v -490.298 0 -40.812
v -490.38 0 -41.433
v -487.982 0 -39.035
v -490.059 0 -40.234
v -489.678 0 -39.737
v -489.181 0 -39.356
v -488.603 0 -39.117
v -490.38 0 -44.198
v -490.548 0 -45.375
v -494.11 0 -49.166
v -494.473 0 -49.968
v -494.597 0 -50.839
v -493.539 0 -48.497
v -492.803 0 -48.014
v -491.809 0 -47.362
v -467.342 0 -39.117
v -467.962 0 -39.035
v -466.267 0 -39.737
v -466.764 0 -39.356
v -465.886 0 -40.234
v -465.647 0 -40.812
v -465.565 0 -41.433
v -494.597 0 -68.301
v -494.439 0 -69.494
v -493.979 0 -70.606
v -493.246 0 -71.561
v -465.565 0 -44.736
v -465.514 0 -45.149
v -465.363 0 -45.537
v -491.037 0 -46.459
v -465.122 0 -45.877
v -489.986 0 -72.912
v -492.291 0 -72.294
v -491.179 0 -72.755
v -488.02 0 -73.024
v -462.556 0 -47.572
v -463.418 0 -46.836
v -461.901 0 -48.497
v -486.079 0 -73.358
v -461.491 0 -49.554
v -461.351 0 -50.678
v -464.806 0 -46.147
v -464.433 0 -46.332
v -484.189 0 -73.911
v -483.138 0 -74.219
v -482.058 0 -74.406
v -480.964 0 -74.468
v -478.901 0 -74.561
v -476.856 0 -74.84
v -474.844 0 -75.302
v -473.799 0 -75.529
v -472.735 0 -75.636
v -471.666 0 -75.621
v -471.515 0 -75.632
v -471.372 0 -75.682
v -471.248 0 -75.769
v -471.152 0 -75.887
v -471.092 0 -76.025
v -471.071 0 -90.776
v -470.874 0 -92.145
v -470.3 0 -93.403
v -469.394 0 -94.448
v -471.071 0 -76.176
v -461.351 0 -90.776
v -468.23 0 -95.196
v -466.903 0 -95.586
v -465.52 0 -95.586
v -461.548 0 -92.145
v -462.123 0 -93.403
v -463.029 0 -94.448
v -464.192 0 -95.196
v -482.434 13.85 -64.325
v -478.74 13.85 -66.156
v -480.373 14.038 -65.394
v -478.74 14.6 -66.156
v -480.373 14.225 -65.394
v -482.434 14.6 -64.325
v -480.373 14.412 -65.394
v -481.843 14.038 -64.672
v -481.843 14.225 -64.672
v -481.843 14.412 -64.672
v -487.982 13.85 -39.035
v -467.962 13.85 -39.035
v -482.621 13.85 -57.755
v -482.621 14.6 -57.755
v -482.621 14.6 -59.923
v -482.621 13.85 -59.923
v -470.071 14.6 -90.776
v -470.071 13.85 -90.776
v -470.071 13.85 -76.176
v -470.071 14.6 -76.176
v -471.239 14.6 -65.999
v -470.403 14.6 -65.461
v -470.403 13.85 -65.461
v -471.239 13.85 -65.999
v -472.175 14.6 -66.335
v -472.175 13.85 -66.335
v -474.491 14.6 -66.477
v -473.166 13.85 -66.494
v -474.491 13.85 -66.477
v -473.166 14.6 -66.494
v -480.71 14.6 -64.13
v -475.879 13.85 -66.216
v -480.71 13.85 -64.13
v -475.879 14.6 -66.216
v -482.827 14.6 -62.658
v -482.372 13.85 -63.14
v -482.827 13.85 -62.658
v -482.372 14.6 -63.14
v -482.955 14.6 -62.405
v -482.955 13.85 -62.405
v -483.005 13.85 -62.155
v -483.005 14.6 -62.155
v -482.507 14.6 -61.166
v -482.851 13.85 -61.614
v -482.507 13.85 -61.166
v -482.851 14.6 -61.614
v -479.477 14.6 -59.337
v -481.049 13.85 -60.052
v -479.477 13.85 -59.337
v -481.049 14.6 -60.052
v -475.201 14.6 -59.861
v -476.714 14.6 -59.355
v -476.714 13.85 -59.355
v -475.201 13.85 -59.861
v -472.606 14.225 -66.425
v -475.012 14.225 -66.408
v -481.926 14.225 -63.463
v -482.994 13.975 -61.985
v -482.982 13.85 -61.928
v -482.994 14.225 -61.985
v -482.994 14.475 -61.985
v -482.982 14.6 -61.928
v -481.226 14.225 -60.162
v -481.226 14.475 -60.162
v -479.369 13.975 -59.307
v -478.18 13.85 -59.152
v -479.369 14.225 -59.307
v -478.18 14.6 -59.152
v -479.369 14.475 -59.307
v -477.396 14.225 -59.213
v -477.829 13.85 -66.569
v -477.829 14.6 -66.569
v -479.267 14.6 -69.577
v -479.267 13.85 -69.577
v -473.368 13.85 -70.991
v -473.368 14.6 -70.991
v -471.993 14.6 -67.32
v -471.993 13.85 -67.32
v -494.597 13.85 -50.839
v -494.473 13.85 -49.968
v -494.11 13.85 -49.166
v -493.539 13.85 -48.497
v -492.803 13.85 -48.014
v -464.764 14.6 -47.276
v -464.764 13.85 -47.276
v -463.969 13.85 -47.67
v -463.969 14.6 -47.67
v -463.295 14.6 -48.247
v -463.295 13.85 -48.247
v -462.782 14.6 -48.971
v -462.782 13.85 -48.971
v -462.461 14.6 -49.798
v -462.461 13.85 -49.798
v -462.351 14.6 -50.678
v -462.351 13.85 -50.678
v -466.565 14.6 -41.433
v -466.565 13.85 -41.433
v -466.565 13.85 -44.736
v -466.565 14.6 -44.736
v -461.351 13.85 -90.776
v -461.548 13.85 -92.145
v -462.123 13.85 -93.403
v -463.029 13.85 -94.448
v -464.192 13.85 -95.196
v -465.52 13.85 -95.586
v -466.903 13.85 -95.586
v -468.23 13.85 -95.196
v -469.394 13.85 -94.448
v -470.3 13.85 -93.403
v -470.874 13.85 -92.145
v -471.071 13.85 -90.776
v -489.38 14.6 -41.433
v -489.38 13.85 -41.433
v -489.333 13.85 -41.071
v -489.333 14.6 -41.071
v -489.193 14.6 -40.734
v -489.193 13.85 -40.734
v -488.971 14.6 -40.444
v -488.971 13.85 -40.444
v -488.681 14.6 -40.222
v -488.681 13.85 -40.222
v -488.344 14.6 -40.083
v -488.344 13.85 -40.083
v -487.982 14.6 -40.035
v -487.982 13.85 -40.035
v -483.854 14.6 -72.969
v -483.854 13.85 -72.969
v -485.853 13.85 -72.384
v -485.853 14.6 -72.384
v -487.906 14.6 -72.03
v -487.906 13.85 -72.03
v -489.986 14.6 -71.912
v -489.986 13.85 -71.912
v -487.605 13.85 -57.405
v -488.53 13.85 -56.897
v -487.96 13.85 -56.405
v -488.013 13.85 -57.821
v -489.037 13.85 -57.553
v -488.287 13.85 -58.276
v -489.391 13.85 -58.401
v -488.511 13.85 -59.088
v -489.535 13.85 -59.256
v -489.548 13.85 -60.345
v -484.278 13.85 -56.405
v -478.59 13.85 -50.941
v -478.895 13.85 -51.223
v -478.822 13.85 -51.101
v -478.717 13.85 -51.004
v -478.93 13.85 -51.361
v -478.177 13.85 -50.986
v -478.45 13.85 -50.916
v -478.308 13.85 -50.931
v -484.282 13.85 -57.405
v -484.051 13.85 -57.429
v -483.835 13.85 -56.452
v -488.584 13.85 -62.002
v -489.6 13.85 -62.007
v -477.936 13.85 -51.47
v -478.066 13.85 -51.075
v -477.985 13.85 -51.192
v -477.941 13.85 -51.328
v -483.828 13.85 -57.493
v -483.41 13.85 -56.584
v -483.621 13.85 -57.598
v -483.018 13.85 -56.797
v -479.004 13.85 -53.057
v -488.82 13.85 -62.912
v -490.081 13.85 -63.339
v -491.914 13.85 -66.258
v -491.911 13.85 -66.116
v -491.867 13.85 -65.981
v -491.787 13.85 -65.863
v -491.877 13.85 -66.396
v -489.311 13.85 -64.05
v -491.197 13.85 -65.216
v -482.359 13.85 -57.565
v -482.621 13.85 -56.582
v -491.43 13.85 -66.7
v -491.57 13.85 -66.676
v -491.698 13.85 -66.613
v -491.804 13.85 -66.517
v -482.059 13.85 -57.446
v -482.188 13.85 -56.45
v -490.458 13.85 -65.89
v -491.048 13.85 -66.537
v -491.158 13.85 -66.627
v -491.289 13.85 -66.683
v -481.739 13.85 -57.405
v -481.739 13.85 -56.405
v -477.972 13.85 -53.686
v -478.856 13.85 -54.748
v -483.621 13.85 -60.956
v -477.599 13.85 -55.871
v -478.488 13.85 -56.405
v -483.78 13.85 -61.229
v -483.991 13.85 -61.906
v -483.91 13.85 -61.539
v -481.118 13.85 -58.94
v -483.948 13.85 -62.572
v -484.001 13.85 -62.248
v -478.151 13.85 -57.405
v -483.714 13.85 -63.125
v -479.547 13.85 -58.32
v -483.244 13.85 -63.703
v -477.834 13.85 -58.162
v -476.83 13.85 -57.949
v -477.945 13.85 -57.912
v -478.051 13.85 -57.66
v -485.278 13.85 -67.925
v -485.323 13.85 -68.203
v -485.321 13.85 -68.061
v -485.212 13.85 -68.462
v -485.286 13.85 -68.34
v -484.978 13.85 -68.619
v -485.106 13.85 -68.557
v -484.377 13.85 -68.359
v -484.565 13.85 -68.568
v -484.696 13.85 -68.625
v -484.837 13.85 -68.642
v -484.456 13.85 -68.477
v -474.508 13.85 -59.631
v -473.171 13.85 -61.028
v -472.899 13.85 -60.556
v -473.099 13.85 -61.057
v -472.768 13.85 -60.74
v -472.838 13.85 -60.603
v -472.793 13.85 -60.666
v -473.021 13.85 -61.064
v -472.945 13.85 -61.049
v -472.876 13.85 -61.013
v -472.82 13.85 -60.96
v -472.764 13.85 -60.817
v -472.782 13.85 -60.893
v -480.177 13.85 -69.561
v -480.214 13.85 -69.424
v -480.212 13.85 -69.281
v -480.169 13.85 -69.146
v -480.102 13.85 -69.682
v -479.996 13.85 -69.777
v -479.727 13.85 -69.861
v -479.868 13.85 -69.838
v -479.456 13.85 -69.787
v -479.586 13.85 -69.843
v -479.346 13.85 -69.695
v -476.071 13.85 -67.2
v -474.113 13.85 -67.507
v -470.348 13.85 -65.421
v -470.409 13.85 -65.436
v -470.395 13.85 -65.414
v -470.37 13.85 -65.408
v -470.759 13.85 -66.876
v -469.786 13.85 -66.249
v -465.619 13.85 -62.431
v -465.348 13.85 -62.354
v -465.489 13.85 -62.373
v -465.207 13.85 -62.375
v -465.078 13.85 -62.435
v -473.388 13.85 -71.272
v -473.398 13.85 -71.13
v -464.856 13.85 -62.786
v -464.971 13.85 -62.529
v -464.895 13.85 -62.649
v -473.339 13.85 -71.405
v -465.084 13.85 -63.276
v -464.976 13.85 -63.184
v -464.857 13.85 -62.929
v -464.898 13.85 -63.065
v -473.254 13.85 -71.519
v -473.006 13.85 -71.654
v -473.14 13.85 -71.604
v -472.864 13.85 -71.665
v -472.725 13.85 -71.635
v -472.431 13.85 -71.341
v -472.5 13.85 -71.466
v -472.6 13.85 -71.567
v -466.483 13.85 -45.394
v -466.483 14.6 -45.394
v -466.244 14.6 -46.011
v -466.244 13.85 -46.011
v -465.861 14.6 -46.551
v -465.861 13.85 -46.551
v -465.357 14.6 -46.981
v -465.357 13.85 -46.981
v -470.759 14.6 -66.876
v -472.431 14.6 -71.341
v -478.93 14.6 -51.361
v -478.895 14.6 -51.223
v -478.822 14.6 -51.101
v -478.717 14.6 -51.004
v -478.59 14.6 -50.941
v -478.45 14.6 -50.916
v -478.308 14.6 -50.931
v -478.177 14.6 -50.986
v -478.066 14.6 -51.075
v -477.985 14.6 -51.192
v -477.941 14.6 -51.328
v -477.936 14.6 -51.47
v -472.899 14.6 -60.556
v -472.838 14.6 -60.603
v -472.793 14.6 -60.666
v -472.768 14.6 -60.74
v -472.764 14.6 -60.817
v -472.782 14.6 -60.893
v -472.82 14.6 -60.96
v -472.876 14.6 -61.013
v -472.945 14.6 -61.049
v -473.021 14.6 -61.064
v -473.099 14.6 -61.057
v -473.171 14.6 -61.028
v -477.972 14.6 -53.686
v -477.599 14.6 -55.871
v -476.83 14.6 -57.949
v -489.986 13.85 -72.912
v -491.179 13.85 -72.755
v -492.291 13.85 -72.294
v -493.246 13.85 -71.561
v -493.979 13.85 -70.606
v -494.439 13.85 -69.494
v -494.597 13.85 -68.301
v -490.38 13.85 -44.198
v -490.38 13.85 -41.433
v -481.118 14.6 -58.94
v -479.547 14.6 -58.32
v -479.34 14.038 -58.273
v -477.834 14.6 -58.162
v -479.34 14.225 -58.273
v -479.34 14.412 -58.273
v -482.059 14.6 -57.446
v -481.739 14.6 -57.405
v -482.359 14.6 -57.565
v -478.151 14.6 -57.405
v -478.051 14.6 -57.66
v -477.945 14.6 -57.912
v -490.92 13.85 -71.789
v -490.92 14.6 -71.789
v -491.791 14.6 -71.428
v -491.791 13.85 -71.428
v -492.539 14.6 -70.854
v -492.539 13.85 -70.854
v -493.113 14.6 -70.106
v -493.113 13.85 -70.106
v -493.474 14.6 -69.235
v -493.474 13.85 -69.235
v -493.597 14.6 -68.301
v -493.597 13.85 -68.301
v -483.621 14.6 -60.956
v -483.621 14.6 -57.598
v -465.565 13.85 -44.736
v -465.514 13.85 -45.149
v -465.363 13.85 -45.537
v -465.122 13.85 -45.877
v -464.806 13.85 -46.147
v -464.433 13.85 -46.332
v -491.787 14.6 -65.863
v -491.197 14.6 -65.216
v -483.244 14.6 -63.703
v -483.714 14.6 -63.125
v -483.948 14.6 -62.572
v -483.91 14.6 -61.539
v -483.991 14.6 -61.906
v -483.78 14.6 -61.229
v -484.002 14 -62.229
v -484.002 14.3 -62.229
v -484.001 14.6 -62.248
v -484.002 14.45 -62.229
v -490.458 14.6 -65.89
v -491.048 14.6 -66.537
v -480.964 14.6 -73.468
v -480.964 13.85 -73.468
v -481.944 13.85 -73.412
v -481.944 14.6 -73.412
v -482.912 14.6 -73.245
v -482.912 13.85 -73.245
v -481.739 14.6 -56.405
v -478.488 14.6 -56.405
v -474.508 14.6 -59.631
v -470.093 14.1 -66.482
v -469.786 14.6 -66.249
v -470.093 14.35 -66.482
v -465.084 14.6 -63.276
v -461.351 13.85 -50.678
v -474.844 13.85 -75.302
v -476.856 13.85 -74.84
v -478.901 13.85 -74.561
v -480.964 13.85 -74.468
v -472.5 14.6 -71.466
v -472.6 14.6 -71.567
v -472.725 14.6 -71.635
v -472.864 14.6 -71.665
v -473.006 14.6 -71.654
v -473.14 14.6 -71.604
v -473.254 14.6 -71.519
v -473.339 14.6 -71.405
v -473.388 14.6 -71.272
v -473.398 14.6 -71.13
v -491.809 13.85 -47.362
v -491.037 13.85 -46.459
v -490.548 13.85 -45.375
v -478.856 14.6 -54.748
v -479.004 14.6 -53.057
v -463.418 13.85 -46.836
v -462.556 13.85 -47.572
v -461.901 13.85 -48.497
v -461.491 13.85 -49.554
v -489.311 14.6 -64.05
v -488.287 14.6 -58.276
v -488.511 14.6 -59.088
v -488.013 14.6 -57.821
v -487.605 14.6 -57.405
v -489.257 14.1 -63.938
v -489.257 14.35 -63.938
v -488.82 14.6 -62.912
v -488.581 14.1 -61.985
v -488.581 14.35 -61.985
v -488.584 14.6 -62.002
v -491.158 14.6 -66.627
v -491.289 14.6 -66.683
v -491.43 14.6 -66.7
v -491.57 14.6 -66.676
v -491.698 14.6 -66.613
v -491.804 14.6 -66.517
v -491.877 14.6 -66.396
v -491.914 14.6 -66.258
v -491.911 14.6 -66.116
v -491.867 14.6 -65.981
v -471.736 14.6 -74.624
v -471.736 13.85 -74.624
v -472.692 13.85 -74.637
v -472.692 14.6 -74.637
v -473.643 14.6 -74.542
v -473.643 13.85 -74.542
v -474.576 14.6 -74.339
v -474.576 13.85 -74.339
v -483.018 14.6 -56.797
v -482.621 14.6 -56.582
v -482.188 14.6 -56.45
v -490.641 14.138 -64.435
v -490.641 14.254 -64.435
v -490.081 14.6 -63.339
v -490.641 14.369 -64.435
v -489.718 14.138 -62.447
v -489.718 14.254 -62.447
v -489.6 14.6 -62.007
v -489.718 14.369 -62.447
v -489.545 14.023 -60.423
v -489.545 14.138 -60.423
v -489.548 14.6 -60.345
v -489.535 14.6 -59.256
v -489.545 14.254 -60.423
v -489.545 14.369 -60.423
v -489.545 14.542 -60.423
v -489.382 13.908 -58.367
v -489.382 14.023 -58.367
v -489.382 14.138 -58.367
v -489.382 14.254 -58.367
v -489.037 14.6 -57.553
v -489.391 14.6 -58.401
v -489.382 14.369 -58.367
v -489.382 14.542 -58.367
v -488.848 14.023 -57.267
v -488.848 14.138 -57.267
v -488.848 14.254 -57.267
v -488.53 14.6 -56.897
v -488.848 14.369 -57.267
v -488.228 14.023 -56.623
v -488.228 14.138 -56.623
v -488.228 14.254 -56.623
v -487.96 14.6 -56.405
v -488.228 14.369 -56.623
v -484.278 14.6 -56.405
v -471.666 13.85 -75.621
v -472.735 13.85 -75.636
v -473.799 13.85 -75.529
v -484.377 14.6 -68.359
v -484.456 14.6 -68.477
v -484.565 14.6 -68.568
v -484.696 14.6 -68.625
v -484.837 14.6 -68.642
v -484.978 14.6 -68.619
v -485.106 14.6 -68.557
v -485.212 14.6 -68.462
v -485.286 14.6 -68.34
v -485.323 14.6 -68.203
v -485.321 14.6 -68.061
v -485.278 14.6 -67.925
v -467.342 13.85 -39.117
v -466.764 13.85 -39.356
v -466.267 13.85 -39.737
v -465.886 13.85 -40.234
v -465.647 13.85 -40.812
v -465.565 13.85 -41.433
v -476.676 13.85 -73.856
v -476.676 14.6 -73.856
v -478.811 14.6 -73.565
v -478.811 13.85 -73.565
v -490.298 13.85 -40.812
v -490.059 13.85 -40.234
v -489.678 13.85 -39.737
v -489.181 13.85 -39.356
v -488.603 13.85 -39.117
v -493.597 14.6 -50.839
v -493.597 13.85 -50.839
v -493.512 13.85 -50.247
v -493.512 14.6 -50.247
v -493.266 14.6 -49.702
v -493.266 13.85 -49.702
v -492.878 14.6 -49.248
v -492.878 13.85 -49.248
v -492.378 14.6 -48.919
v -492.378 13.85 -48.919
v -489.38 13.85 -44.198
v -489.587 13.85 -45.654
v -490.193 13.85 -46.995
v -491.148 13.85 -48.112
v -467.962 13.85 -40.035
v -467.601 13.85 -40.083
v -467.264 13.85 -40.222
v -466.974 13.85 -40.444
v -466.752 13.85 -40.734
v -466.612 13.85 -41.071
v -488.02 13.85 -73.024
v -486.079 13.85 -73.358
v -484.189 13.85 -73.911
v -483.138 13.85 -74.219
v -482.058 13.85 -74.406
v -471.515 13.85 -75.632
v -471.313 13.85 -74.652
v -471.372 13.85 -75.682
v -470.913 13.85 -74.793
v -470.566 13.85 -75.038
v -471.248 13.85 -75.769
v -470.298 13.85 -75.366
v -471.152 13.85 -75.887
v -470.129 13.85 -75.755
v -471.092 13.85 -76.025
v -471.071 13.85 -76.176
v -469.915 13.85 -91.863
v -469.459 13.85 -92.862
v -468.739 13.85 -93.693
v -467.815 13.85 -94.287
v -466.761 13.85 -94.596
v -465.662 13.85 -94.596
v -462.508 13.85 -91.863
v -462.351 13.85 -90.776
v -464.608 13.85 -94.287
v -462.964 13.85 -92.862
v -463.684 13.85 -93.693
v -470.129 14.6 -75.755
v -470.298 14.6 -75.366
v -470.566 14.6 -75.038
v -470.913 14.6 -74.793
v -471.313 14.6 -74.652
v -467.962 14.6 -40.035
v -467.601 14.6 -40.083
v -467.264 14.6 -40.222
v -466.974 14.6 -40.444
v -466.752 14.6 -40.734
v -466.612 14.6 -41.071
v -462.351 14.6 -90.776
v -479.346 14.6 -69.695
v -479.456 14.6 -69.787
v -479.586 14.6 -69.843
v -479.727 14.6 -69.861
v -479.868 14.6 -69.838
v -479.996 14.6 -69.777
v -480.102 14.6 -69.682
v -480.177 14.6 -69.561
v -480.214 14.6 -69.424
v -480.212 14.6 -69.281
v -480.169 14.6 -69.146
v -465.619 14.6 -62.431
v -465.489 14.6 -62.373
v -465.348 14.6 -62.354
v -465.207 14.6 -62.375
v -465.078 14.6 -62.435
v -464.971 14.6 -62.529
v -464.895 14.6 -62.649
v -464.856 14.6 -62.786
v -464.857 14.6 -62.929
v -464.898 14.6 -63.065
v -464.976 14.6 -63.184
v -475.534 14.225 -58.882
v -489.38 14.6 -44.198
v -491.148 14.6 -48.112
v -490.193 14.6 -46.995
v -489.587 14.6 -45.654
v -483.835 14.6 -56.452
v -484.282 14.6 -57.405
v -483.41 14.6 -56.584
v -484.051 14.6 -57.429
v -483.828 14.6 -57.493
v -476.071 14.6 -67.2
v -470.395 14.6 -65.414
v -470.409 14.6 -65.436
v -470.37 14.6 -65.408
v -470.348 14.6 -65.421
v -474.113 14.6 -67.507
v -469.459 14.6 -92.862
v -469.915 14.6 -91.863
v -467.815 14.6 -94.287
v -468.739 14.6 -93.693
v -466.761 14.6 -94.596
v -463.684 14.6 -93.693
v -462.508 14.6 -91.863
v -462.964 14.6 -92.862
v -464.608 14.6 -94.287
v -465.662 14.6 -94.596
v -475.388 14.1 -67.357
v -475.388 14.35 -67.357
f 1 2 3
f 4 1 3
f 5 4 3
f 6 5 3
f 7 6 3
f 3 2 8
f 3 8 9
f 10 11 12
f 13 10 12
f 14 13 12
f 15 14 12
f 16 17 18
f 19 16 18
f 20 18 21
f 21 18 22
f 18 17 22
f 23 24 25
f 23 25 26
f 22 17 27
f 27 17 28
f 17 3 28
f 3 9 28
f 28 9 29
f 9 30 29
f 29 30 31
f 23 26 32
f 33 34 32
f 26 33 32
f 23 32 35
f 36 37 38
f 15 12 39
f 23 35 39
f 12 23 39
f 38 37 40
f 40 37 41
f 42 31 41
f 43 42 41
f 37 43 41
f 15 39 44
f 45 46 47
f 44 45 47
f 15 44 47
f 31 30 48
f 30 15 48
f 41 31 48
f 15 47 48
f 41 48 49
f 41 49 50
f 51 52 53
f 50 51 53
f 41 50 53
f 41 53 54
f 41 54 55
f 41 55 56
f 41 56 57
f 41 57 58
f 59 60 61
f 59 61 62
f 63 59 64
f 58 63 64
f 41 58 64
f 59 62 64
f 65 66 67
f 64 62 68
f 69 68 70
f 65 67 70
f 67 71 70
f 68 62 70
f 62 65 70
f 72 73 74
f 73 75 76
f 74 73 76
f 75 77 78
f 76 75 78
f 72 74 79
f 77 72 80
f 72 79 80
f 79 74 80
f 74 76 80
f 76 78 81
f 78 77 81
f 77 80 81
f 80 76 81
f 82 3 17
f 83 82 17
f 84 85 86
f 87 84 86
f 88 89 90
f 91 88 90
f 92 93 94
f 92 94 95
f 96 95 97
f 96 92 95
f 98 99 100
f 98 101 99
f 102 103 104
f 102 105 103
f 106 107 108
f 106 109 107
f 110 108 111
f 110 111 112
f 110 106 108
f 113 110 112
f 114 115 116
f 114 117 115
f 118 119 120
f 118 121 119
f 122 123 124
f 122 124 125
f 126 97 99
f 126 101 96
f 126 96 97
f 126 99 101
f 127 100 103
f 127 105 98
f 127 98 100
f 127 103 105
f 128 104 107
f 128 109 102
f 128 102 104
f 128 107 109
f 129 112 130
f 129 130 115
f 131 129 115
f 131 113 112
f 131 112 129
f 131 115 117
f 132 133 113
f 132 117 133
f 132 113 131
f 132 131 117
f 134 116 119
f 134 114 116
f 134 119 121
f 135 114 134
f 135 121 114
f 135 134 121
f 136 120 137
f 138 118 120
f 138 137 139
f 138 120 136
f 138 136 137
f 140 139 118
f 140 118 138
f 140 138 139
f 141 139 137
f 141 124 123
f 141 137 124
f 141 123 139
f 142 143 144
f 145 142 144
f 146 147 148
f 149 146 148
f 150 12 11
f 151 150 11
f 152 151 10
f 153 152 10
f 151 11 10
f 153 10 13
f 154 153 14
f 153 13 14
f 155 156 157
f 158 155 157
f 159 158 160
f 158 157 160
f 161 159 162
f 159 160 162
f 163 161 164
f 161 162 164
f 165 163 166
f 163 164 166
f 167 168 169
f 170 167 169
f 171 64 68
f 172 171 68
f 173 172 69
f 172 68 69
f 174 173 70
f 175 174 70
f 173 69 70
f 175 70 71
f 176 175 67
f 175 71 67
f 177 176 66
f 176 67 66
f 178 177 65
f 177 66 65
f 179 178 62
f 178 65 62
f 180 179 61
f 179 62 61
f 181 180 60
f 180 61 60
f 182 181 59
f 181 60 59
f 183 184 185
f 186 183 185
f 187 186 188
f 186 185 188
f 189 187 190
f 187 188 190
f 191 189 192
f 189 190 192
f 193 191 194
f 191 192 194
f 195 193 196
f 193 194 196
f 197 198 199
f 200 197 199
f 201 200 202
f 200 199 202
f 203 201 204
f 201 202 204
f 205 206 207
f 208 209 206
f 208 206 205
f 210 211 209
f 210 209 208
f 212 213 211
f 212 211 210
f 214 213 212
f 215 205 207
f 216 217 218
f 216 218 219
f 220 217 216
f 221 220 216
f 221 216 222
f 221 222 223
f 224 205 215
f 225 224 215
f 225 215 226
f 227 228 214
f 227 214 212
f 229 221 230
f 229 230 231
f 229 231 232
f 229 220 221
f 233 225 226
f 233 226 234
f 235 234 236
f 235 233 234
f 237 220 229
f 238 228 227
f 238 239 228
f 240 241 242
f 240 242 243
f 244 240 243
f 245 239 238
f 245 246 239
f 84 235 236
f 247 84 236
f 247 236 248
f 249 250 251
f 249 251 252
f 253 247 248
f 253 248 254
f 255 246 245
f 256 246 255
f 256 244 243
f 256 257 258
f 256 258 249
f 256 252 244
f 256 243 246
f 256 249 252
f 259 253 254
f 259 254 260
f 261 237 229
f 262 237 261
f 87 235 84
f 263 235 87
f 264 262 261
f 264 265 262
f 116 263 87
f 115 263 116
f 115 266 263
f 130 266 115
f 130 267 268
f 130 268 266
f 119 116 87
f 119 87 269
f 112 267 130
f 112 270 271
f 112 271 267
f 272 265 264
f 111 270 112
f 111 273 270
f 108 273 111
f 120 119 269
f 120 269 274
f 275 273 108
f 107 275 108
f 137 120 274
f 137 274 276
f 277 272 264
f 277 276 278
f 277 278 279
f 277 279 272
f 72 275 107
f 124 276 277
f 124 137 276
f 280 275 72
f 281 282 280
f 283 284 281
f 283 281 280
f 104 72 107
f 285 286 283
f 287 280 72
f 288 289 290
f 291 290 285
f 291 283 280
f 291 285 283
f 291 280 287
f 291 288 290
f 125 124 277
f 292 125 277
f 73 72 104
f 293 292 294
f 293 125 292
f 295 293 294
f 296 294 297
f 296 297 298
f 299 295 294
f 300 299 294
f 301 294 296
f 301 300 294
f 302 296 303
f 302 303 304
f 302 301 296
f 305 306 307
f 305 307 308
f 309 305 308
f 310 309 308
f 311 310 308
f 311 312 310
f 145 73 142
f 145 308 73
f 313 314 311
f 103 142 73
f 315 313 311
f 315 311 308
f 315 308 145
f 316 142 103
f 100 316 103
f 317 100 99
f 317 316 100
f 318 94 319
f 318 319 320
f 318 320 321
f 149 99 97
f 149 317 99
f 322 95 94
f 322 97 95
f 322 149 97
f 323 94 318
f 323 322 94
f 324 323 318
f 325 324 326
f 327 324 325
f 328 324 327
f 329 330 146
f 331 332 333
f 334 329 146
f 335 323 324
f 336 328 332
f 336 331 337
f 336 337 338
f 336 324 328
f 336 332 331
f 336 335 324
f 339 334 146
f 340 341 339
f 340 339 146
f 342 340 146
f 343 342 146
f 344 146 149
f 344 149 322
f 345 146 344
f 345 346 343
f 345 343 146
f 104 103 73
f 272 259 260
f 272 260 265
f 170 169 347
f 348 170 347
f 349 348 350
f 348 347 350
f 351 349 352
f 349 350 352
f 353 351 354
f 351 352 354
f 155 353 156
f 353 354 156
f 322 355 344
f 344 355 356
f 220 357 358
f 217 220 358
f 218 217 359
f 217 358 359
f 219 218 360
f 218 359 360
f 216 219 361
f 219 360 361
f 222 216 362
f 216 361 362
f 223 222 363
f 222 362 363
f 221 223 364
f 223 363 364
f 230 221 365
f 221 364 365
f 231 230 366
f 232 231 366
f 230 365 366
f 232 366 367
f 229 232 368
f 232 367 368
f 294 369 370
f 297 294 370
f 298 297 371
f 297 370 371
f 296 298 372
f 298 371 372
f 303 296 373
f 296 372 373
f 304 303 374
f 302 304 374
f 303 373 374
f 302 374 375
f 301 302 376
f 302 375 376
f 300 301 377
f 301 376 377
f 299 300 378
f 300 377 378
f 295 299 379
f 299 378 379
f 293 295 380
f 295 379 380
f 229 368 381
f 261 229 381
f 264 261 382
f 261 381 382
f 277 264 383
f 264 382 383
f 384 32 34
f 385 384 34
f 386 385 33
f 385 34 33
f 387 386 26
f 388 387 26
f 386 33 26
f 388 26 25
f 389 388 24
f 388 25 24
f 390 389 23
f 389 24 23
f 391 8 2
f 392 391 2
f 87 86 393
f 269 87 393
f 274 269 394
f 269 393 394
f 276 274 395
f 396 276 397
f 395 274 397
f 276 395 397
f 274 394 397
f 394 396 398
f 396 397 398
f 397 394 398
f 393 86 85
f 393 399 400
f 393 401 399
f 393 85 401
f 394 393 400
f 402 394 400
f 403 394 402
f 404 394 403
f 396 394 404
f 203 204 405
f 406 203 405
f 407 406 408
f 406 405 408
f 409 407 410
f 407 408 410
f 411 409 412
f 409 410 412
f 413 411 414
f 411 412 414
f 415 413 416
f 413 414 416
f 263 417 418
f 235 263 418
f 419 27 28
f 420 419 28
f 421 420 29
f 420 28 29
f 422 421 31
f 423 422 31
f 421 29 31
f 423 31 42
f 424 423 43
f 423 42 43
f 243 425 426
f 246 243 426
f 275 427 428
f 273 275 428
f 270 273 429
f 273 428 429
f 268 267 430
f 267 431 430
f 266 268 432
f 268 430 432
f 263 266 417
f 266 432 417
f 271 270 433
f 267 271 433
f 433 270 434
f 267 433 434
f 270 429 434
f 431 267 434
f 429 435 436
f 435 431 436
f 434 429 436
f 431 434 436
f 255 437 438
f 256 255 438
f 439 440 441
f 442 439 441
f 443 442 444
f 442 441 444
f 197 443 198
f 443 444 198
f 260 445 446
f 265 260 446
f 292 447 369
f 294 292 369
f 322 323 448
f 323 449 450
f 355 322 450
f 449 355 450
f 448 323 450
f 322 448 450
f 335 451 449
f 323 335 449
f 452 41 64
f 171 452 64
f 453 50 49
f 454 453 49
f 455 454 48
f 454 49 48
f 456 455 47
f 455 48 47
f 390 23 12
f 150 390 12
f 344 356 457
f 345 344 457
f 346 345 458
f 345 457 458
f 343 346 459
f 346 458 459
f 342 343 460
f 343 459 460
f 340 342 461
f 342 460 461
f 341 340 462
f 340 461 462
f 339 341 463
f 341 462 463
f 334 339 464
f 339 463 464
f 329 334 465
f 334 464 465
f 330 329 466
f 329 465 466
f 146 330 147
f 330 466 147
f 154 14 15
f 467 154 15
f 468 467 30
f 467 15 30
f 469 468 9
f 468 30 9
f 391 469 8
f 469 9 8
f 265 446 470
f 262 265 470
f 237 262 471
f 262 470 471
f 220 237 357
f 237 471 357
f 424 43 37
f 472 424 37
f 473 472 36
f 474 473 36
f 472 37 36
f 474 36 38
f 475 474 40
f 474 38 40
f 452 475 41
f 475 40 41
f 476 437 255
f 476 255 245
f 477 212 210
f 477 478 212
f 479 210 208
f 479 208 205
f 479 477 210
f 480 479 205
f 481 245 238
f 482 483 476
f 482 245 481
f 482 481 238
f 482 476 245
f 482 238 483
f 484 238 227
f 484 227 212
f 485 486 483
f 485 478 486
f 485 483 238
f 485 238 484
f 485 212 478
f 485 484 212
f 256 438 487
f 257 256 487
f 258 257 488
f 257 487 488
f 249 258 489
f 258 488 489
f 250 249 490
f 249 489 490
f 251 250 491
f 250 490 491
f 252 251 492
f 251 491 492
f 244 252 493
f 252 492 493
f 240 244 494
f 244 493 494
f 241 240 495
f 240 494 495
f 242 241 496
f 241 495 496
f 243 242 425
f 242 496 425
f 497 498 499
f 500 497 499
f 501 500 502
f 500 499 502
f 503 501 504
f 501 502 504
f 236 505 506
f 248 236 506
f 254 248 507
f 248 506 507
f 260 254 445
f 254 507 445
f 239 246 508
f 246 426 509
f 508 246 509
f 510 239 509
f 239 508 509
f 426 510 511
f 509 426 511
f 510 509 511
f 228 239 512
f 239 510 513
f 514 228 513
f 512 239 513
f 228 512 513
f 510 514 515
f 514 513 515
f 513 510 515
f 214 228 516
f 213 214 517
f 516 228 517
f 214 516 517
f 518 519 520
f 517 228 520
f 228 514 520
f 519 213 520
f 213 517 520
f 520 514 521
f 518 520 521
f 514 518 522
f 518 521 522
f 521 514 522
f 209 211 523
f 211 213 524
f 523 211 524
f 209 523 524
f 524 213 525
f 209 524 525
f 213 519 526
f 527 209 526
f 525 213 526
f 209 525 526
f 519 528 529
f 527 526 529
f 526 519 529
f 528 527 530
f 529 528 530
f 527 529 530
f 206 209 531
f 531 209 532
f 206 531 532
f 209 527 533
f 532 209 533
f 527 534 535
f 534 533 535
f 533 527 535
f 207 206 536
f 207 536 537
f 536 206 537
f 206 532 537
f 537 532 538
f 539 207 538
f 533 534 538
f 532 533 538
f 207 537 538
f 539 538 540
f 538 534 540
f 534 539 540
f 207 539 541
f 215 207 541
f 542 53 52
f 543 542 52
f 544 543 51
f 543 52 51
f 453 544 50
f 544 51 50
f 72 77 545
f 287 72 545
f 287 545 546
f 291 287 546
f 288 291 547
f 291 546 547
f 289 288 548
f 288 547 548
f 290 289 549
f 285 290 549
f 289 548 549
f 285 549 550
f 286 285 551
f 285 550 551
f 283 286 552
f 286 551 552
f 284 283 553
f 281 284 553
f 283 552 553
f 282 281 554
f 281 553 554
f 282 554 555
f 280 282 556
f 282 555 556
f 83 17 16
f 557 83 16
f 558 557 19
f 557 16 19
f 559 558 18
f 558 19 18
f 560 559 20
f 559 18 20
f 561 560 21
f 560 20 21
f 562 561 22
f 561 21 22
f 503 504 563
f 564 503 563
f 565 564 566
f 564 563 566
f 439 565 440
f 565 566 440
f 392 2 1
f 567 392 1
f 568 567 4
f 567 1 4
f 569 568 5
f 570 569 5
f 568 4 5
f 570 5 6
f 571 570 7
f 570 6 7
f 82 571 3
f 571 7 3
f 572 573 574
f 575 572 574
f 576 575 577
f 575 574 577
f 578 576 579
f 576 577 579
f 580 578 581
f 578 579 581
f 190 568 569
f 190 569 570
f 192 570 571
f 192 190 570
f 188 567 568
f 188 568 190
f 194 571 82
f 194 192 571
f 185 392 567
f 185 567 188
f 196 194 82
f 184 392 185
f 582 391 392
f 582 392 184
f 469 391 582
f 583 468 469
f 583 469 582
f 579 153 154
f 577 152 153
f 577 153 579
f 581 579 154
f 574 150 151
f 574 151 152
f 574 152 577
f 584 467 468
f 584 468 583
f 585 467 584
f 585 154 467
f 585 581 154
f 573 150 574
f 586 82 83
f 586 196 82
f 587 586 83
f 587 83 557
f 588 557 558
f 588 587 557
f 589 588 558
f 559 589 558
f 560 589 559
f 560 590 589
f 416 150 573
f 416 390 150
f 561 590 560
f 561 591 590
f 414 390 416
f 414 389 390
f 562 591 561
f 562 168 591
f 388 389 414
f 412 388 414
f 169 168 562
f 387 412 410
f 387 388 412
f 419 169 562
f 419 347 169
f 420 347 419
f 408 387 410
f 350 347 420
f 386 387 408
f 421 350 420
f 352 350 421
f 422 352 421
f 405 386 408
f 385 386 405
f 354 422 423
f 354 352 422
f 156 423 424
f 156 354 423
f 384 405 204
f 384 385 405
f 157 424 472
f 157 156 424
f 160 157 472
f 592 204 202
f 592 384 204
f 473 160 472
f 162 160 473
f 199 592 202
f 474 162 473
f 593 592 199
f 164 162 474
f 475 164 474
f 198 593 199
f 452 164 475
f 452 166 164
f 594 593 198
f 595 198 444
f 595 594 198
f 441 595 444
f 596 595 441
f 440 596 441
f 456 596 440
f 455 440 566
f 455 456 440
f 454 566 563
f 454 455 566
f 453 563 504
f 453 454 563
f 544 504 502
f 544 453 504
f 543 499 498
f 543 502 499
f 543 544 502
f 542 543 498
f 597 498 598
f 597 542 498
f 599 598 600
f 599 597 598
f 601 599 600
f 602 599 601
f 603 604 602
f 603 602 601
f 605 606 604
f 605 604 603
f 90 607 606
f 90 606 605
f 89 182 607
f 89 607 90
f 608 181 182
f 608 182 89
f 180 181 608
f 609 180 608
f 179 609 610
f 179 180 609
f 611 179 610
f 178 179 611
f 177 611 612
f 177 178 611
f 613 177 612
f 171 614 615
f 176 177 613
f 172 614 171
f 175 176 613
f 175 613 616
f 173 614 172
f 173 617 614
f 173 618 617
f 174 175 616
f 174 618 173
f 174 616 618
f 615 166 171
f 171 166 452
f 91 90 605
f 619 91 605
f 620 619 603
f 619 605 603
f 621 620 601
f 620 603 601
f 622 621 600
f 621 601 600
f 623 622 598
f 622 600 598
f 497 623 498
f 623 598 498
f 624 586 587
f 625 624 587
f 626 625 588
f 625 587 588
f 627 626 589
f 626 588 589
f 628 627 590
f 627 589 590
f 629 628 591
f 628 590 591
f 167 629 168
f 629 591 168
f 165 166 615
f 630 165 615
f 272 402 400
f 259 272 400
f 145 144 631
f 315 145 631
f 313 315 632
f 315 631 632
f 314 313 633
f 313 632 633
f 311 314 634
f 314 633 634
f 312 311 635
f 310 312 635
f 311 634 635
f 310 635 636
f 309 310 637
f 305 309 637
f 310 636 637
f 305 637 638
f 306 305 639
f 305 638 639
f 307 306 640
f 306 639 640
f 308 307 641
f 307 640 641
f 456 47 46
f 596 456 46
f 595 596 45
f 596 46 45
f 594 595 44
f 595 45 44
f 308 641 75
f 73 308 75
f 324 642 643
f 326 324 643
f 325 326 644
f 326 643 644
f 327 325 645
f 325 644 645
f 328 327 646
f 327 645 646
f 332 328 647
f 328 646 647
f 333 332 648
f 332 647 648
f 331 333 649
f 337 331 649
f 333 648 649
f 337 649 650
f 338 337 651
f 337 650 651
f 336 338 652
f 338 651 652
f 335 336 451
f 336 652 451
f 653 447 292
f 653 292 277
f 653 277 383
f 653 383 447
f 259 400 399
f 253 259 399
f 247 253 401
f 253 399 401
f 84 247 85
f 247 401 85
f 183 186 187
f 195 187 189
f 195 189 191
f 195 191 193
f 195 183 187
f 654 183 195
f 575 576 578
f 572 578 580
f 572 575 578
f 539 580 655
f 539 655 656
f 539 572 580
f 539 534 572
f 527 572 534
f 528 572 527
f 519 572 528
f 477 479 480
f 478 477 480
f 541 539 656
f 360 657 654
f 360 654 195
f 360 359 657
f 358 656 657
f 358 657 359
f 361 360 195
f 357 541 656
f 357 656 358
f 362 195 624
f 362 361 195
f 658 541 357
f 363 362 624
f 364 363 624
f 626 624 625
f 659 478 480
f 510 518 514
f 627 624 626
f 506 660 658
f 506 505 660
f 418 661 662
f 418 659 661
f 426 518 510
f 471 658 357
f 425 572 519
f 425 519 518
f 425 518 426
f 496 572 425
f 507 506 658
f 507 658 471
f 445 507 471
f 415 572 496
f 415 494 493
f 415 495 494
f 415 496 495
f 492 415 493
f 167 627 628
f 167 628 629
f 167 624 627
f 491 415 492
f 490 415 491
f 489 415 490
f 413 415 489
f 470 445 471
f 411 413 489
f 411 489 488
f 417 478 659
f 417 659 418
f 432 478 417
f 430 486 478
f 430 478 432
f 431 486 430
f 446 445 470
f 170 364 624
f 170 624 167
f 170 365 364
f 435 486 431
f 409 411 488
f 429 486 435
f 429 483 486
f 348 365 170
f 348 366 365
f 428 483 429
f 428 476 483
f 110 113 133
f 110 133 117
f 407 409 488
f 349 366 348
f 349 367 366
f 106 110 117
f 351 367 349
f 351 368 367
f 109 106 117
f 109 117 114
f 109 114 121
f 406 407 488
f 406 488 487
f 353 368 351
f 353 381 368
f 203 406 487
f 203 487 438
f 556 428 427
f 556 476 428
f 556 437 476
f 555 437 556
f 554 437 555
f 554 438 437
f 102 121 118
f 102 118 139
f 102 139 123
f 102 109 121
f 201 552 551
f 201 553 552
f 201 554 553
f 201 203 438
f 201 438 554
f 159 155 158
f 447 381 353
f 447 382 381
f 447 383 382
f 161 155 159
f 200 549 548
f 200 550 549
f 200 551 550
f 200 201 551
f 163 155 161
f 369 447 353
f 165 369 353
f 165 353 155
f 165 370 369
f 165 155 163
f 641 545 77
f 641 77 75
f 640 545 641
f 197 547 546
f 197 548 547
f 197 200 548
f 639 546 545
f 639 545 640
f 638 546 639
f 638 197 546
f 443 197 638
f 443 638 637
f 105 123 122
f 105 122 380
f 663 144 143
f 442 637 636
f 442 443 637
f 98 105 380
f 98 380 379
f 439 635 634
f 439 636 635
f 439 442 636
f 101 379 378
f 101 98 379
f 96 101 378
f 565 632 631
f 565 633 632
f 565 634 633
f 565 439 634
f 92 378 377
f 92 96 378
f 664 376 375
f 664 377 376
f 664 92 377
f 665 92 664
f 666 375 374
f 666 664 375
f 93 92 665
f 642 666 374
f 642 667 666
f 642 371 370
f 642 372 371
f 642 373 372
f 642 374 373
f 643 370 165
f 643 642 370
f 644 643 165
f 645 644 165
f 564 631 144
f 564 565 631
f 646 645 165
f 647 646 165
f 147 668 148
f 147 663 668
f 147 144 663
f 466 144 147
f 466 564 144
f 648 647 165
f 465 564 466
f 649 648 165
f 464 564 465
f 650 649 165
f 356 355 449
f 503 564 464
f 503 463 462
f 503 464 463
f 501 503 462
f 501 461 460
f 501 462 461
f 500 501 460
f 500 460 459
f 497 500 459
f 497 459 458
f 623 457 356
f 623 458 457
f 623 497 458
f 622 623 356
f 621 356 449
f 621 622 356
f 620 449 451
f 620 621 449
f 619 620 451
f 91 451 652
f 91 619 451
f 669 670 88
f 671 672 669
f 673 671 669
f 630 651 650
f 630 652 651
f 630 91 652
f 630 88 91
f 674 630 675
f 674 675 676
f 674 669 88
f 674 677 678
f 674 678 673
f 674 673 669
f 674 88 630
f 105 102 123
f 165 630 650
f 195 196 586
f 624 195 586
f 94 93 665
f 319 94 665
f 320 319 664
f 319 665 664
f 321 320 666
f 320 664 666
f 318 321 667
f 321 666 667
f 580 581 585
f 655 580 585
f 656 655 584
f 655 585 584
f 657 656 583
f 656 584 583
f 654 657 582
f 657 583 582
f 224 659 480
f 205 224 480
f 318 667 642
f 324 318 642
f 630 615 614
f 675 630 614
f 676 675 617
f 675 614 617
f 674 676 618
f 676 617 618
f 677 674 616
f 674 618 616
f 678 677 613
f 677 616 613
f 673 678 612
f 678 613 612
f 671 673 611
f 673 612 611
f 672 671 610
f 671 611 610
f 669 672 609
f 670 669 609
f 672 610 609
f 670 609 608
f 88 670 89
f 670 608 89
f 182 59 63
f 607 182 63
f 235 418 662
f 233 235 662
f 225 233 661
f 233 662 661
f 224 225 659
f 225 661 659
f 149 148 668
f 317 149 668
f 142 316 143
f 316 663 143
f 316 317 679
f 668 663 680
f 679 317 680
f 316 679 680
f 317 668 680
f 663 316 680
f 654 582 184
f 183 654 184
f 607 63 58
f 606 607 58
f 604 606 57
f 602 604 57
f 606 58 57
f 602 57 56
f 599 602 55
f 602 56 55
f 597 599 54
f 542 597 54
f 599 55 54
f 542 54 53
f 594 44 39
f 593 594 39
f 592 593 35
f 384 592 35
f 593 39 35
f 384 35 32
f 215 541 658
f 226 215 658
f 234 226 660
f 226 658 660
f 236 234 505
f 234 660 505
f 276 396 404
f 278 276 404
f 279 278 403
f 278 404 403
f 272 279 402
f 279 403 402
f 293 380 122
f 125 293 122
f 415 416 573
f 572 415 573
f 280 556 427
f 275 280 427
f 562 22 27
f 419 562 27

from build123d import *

# Parameters (mm, degrees)
BOSS_EXTRU_1_DEPTH = 14.6
CUT_EXTRUDE1_DEPTH = 0.75
CUT_EXTRUDE2_START = -0.75
CUT_EXTRUDE2_DEPTH = 0.75


with BuildPart() as part:
    # Esquisse2 → Boss.-Extru.1 (new body)
    with BuildSketch(Plane(origin=(0, 0, 0), x_dir=(1, 0, 0), z_dir=(0, 1, 0))):
        with BuildLine():
            Line((-461.351388226, 50.678431152), (-461.351388226, 90.775522892))
            ThreePointArc((-461.351388226, 90.775522892), (-466.211366791, 95.635501457), (-471.071345356, 90.775522892))
            Line((-471.071345356, 90.775522892), (-471.071345356, 76.175522892))
            ThreePointArc((-471.071345356, 76.175522892), (-471.248130994, 75.769164395), (-471.66594897, 75.621487285))
            ThreePointArc((-471.66594897, 75.621487285), (-473.268553235, 75.597795011), (-474.843817202, 75.302083679))
            ThreePointArc((-474.843817202, 75.302083679), (-477.875381422, 74.67740473), (-480.963538252, 74.467898632))
            ThreePointArc((-480.963538252, 74.467898632), (-482.600253942, 74.327779354), (-484.189336279, 73.911499414))
            ThreePointArc((-484.189336279, 73.911499414), (-487.044689997, 73.163503891), (-489.985634038, 72.911729587))
            ThreePointArc((-489.985634038, 72.911729587), (-493.246058953, 71.561217368), (-494.596571172, 68.300792453))
            Line((-494.596571172, 68.300792453), (-494.596571172, 50.839303584))
            ThreePointArc((-494.596571172, 50.839303584), (-494.110289111, 49.166185675), (-492.802956825, 48.014371421))
            ThreePointArc((-492.802956825, 48.014371421), (-491.037015464, 46.458503449), (-490.380146806, 44.198459732))
            Line((-490.380146806, 44.198459732), (-490.380146806, 41.432618273))
            ThreePointArc((-490.380146806, 41.432618273), (-489.677889469, 39.737219085), (-487.982490281, 39.034961748))
            Line((-487.982490281, 39.034961748), (-467.962472456, 39.034961748))
            ThreePointArc((-467.962472456, 39.034961748), (-466.267073268, 39.737219085), (-465.564815931, 41.432618273))
            Line((-465.564815931, 41.432618273), (-465.564815931, 44.736417722))
            ThreePointArc((-465.564815931, 44.736417722), (-465.25323649, 45.714489805), (-464.433325852, 46.332108859))
            ThreePointArc((-464.433325852, 46.332108859), (-462.200064163, 48.014371421), (-461.351388226, 50.678431152))
        make_face()
    extrude(amount=BOSS_EXTRU_1_DEPTH)

    # Esquisse4 → Cut-Extrude1 (cut)
    with BuildSketch(Plane(origin=(0, 14.6, 0), x_dir=(1, 0, 0), z_dir=(0, 1, 0))):
        with BuildLine():
            Line((-470.759038399, 66.876254444), (-472.431256119, 71.341307125))
            ThreePointArc((-472.431256119, 71.341307125), (-473.074857274, 71.634185177), (-473.367735327, 70.990584023))
            Line((-473.367735327, 70.990584023), (-471.993157719, 67.320271624))
            add(Edge.make_bspline(
                [(-471.993157719, 67.320271624), (-472.180478604, 67.36498208), (-473.344002436, 67.587235479), (-475.479739271, 67.472490346), (-477.043546697, 66.90883882), (-477.828675922, 66.569064368)],
                knots=[0.068797937, 0.068797937, 0.068797937, 0.068797937, 0.085212198, 0.170424395, 0.255222354, 0.255222354, 0.255222354, 0.255222354], degree=3))
            Line((-477.828675922, 66.569064368), (-479.267266322, 69.577025126))
            ThreePointArc((-479.267266322, 69.577025126), (-479.934061212, 69.812364403), (-480.169400489, 69.145569513))
            Line((-480.169400489, 69.145569513), (-478.739708759, 66.156215062))
            add(Edge.make_bspline(
                [(-478.739708759, 66.156215062), (-478.841024014, 66.108993774), (-479.354480109, 65.868730534), (-480.336105389, 65.411150949), (-481.572356528, 64.836708033), (-482.243555734, 64.447144423), (-482.434113402, 64.325134018)],
                knots=[0.287644358, 0.287644358, 0.287644358, 0.287644358, 0.298242692, 0.340848791, 0.38345489, 0.401256901, 0.401256901, 0.401256901, 0.401256901], degree=3))
            Line((-482.434113402, 64.325134018), (-484.376696119, 68.359024433))
            ThreePointArc((-484.376696119, 68.359024433), (-485.044120706, 68.592571896), (-485.277668173, 67.92514731))
            Line((-485.277668173, 67.92514731), (-483.244253147, 63.702638116))
            add(Edge.make_bspline(
                [(-483.244253147, 63.702638116), (-483.418919034, 63.535954123), (-483.760315122, 63.142157659), (-484.042020949, 62.414395148), (-483.98092589, 61.705227649), (-483.81969142, 61.284857812), (-483.685609155, 61.05413183), (-483.620520673, 60.956427528)],
                knots=[0.428301618, 0.428301618, 0.428301618, 0.428301618, 0.447364038, 0.468667087, 0.479318612, 0.489970137, 0.498689123, 0.498689123, 0.498689123, 0.498689123], degree=3))
            Line((-483.620520673, 60.956427528), (-483.620520673, 57.597881669))
            ThreePointArc((-483.620520673, 57.597881669), (-483.937770251, 57.455882294), (-484.281674888, 57.405476759))
            Line((-484.281674888, 57.405476759), (-487.605186099, 57.405476759))
            add(Edge.make_bspline(
                [(-490.458271221, 65.889651605), (-489.964259208, 65.347801564), (-489.257587251, 64.008444797), (-488.043116631, 61.175336728), (-489.057887679, 58.585169194), (-487.605186099, 57.405476759)],
                knots=[0, 0, 0, 0, 0.249547348, 0.474449153, 1, 1, 1, 1], degree=3))
            Line((-490.458271221, 65.889651605), (-491.048066053, 66.536559667))
            ThreePointArc((-491.048066053, 66.536559667), (-491.754419993, 66.569180401), (-491.787040726, 65.862826461))
            Line((-491.787040726, 65.862826461), (-491.197245894, 65.215918399))
            add(Edge.make_bspline(
                [(-491.197245894, 65.215918399), (-491.095097262, 65.103878105), (-490.913977468, 64.874895205), (-490.547291291, 64.301678952), (-490.112893659, 63.432242493), (-489.67204398, 62.416186706), (-489.504878635, 61.586502311), (-489.545778679, 60.45666192), (-489.577909133, 59.345919755), (-489.409307696, 58.369978179), (-489.164894876, 57.743514674), (-488.855110289, 57.261917218), (-488.580019374, 56.929642688), (-488.203701982, 56.597390566), (-488.049329474, 56.477953416), (-487.960080001, 56.405476808)],
                knots=[0, 0, 0, 0, 0.06457641, 0.129152819, 0.258305639, 0.387458458, 0.516611277, 0.645764097, 0.774916916, 0.839493325, 0.904069735, 0.93635794, 0.968646145, 1.00093435, 1.033222554, 1.033222554, 1.033222554, 1.033222554], degree=3))
            Line((-487.960080001, 56.405476808), (-484.27830747, 56.405476808))
            ThreePointArc((-484.27830747, 56.405476808), (-483.619158654, 56.507503464), (-483.018252357, 56.796982689))
            ThreePointArc((-483.018252357, 56.796982689), (-482.407788066, 56.505542911), (-481.738765966, 56.405476808))
            Line((-481.738765966, 56.405476808), (-478.488031211, 56.405476808))
            ThreePointArc((-478.488031211, 56.405476808), (-478.957737586, 53.904962522), (-478.929991667, 51.360866232))
            ThreePointArc((-478.929991667, 51.360866232), (-478.378479008, 50.918335117), (-477.935947893, 51.469847775))
            ThreePointArc((-477.935947893, 51.469847775), (-477.83656682, 54.786935808), (-476.829735496, 57.949093346))
            add(Edge.make_bspline(
                [(-474.508389009, 59.630573263), (-475.39957607, 58.974494681), (-476.829735496, 57.949093346)],
                knots=[0.955294065, 0.955294065, 0.955294065, 1, 1, 1], degree=2))
            Line((-474.508389009, 59.630573263), (-472.899170253, 60.555580278))
            ThreePointArc((-472.899170253, 60.555580278), (-472.798739907, 60.927560405), (-473.170720034, 61.027990752))
            Line((-473.170720034, 61.027990752), (-475.200560004, 59.861203335))
            add(Edge.make_bspline(
                [(-470.402527361, 65.460857516), (-471.656956737, 66.515168583), (-475.322492763, 66.806340084), (-478.871859969, 64.906936953), (-484.363975035, 62.557505369), (-480.712618445, 59.603798607), (-478.225902463, 58.808845566), (-475.900969447, 59.583081624), (-475.200560004, 59.861203335)],
                knots=[0, 0, 0, 0, 0.16361185, 0.327509924, 0.477241817, 0.563600697, 0.697734382, 0.765481354, 0.765481354, 0.765481354, 0.765481354], degree=3))
            ThreePointArc((-470.402527361, 65.460857516), (-470.39519915, 65.413665236), (-470.34800687, 65.420993448))
            Line((-470.34800687, 65.420993448), (-465.618535182, 62.431067479))
            ThreePointArc((-465.618535182, 62.431067479), (-464.928726258, 62.586514085), (-465.084172863, 63.27632301))
            Line((-465.084172863, 63.27632301), (-469.785886114, 66.248700365))
            add(Edge.make_bspline(
                [(-469.785886114, 66.248700365), (-470.08228622, 66.493908564), (-470.414152153, 66.704476344), (-470.759038399, 66.876254444)],
                knots=[0.000946473, 0.000946473, 0.000946473, 0.000946473, 0.032279754, 0.032279754, 0.032279754, 0.032279754], degree=3))
        make_face()
        with BuildLine():
            ThreePointArc((-477.834269574, 58.161899431), (-477.998837916, 57.786197293), (-478.151437751, 57.405476759))
            Line((-478.151437751, 57.405476759), (-481.738765966, 57.405476759))
            ThreePointArc((-481.738765966, 57.405476759), (-482.213049829, 57.496092802), (-482.620520673, 57.755175725))
            Line((-482.620520673, 57.755175725), (-482.620520673, 59.923424064))
            add(Edge.make_bspline(
                [(-482.620520673, 59.923424064), (-482.437562835, 59.77785948), (-481.806793393, 59.321946019), (-480.7515692, 58.705977162), (-479.366332949, 58.209178182), (-478.336605496, 58.132512954), (-477.834269574, 58.161899431)],
                knots=[0.535685582, 0.535685582, 0.535685582, 0.535685582, 0.553879285, 0.596485384, 0.639091483, 0.681697582, 0.681697582, 0.681697582, 0.681697582], degree=3))
        make_face(mode=Mode.SUBTRACT)
    extrude(amount=-CUT_EXTRUDE1_DEPTH, mode=Mode.SUBTRACT)

    # Sketch1 → Cut-Extrude2 (cut)
    with BuildSketch(Plane(origin=(0, 14.6, 0), x_dir=(1, 0, 0), z_dir=(0, 1, 0)).offset(CUT_EXTRUDE2_START)):
        with BuildLine():
            Line((-461.351388226, 50.678431152), (-461.351388226, 90.775522892))
            ThreePointArc((-461.351388226, 90.775522892), (-466.211366791, 95.635501457), (-471.071345356, 90.775522892))
            Line((-471.071345356, 90.775522892), (-471.071345356, 76.175522892))
            ThreePointArc((-471.071345356, 76.175522892), (-471.248130994, 75.769164395), (-471.66594897, 75.621487285))
            ThreePointArc((-471.66594897, 75.621487285), (-473.268553235, 75.597795011), (-474.843817202, 75.302083679))
            ThreePointArc((-474.843817202, 75.302083679), (-477.875381422, 74.67740473), (-480.963538252, 74.467898632))
            ThreePointArc((-480.963538252, 74.467898632), (-482.600253942, 74.327779354), (-484.189336279, 73.911499414))
            ThreePointArc((-484.189336279, 73.911499414), (-487.044689997, 73.163503891), (-489.985634038, 72.911729587))
            ThreePointArc((-489.985634038, 72.911729587), (-493.246058953, 71.561217368), (-494.596571172, 68.300792453))
            Line((-494.596571172, 68.300792453), (-494.596571172, 50.839303584))
            ThreePointArc((-494.596571172, 50.839303584), (-494.110289111, 49.166185675), (-492.802956825, 48.014371421))
            ThreePointArc((-492.802956825, 48.014371421), (-491.037015464, 46.458503449), (-490.380146806, 44.198459732))
            Line((-490.380146806, 44.198459732), (-490.380146806, 41.432618273))
            ThreePointArc((-490.380146806, 41.432618273), (-489.677889469, 39.737219085), (-487.982490281, 39.034961748))
            Line((-487.982490281, 39.034961748), (-467.962472456, 39.034961748))
            ThreePointArc((-467.962472456, 39.034961748), (-466.267073268, 39.737219085), (-465.564815931, 41.432618273))
            Line((-465.564815931, 41.432618273), (-465.564815931, 44.736417722))
            ThreePointArc((-465.564815931, 44.736417722), (-465.25323649, 45.714489805), (-464.433325852, 46.332108859))
            ThreePointArc((-464.433325852, 46.332108859), (-462.200064163, 48.014371421), (-461.351388226, 50.678431152))
        make_face()
        with BuildLine():
            Line((-462.351388226, 50.678431152), (-462.351388226, 90.775522892))
            ThreePointArc((-462.351388226, 90.775522892), (-466.211366791, 94.635501457), (-470.071345356, 90.775522892))
            Line((-470.071345356, 90.775522892), (-470.071345356, 76.175522892))
            ThreePointArc((-470.071345356, 76.175522892), (-470.566423079, 75.037539957), (-471.736497608, 74.623978944))
            ThreePointArc((-471.736497608, 74.623978944), (-473.168548328, 74.602808068), (-474.576168379, 74.338567147))
            ThreePointArc((-474.576168379, 74.338567147), (-477.740319459, 73.686567576), (-480.963538252, 73.467898632))
            ThreePointArc((-480.963538252, 73.467898632), (-482.430279639, 73.342330859), (-483.854334437, 72.969281942))
            ThreePointArc((-483.854334437, 72.969281942), (-486.874715694, 72.178055396), (-489.985634038, 71.911729587))
            ThreePointArc((-489.985634038, 71.911729587), (-492.538952172, 70.854110587), (-493.596571172, 68.300792453))
            Line((-493.596571172, 68.300792453), (-493.596571172, 50.839303584))
            ThreePointArc((-493.596571172, 50.839303584), (-493.266077191, 49.702195222), (-492.377569295, 48.919382719))
            ThreePointArc((-492.377569295, 48.919382719), (-490.192803545, 46.994512997), (-489.380146806, 44.198459732))
            Line((-489.380146806, 44.198459732), (-489.380146806, 41.432618273))
            ThreePointArc((-489.380146806, 41.432618273), (-488.970782687, 40.444325866), (-487.982490281, 40.034961748))
            Line((-487.982490281, 40.034961748), (-467.962472456, 40.034961748))
            ThreePointArc((-467.962472456, 40.034961748), (-466.974180049, 40.444325866), (-466.564815931, 41.432618273))
            Line((-466.564815931, 41.432618273), (-466.564815931, 44.736417722))
            ThreePointArc((-466.564815931, 44.736417722), (-466.068969381, 46.292918583), (-464.764166151, 47.275795616))
            ThreePointArc((-464.764166151, 47.275795616), (-463.015797054, 48.592800198), (-462.351388226, 50.678431152))
        make_face(mode=Mode.SUBTRACT)
    extrude(amount=CUT_EXTRUDE2_DEPTH, mode=Mode.SUBTRACT)


solid = part.part
